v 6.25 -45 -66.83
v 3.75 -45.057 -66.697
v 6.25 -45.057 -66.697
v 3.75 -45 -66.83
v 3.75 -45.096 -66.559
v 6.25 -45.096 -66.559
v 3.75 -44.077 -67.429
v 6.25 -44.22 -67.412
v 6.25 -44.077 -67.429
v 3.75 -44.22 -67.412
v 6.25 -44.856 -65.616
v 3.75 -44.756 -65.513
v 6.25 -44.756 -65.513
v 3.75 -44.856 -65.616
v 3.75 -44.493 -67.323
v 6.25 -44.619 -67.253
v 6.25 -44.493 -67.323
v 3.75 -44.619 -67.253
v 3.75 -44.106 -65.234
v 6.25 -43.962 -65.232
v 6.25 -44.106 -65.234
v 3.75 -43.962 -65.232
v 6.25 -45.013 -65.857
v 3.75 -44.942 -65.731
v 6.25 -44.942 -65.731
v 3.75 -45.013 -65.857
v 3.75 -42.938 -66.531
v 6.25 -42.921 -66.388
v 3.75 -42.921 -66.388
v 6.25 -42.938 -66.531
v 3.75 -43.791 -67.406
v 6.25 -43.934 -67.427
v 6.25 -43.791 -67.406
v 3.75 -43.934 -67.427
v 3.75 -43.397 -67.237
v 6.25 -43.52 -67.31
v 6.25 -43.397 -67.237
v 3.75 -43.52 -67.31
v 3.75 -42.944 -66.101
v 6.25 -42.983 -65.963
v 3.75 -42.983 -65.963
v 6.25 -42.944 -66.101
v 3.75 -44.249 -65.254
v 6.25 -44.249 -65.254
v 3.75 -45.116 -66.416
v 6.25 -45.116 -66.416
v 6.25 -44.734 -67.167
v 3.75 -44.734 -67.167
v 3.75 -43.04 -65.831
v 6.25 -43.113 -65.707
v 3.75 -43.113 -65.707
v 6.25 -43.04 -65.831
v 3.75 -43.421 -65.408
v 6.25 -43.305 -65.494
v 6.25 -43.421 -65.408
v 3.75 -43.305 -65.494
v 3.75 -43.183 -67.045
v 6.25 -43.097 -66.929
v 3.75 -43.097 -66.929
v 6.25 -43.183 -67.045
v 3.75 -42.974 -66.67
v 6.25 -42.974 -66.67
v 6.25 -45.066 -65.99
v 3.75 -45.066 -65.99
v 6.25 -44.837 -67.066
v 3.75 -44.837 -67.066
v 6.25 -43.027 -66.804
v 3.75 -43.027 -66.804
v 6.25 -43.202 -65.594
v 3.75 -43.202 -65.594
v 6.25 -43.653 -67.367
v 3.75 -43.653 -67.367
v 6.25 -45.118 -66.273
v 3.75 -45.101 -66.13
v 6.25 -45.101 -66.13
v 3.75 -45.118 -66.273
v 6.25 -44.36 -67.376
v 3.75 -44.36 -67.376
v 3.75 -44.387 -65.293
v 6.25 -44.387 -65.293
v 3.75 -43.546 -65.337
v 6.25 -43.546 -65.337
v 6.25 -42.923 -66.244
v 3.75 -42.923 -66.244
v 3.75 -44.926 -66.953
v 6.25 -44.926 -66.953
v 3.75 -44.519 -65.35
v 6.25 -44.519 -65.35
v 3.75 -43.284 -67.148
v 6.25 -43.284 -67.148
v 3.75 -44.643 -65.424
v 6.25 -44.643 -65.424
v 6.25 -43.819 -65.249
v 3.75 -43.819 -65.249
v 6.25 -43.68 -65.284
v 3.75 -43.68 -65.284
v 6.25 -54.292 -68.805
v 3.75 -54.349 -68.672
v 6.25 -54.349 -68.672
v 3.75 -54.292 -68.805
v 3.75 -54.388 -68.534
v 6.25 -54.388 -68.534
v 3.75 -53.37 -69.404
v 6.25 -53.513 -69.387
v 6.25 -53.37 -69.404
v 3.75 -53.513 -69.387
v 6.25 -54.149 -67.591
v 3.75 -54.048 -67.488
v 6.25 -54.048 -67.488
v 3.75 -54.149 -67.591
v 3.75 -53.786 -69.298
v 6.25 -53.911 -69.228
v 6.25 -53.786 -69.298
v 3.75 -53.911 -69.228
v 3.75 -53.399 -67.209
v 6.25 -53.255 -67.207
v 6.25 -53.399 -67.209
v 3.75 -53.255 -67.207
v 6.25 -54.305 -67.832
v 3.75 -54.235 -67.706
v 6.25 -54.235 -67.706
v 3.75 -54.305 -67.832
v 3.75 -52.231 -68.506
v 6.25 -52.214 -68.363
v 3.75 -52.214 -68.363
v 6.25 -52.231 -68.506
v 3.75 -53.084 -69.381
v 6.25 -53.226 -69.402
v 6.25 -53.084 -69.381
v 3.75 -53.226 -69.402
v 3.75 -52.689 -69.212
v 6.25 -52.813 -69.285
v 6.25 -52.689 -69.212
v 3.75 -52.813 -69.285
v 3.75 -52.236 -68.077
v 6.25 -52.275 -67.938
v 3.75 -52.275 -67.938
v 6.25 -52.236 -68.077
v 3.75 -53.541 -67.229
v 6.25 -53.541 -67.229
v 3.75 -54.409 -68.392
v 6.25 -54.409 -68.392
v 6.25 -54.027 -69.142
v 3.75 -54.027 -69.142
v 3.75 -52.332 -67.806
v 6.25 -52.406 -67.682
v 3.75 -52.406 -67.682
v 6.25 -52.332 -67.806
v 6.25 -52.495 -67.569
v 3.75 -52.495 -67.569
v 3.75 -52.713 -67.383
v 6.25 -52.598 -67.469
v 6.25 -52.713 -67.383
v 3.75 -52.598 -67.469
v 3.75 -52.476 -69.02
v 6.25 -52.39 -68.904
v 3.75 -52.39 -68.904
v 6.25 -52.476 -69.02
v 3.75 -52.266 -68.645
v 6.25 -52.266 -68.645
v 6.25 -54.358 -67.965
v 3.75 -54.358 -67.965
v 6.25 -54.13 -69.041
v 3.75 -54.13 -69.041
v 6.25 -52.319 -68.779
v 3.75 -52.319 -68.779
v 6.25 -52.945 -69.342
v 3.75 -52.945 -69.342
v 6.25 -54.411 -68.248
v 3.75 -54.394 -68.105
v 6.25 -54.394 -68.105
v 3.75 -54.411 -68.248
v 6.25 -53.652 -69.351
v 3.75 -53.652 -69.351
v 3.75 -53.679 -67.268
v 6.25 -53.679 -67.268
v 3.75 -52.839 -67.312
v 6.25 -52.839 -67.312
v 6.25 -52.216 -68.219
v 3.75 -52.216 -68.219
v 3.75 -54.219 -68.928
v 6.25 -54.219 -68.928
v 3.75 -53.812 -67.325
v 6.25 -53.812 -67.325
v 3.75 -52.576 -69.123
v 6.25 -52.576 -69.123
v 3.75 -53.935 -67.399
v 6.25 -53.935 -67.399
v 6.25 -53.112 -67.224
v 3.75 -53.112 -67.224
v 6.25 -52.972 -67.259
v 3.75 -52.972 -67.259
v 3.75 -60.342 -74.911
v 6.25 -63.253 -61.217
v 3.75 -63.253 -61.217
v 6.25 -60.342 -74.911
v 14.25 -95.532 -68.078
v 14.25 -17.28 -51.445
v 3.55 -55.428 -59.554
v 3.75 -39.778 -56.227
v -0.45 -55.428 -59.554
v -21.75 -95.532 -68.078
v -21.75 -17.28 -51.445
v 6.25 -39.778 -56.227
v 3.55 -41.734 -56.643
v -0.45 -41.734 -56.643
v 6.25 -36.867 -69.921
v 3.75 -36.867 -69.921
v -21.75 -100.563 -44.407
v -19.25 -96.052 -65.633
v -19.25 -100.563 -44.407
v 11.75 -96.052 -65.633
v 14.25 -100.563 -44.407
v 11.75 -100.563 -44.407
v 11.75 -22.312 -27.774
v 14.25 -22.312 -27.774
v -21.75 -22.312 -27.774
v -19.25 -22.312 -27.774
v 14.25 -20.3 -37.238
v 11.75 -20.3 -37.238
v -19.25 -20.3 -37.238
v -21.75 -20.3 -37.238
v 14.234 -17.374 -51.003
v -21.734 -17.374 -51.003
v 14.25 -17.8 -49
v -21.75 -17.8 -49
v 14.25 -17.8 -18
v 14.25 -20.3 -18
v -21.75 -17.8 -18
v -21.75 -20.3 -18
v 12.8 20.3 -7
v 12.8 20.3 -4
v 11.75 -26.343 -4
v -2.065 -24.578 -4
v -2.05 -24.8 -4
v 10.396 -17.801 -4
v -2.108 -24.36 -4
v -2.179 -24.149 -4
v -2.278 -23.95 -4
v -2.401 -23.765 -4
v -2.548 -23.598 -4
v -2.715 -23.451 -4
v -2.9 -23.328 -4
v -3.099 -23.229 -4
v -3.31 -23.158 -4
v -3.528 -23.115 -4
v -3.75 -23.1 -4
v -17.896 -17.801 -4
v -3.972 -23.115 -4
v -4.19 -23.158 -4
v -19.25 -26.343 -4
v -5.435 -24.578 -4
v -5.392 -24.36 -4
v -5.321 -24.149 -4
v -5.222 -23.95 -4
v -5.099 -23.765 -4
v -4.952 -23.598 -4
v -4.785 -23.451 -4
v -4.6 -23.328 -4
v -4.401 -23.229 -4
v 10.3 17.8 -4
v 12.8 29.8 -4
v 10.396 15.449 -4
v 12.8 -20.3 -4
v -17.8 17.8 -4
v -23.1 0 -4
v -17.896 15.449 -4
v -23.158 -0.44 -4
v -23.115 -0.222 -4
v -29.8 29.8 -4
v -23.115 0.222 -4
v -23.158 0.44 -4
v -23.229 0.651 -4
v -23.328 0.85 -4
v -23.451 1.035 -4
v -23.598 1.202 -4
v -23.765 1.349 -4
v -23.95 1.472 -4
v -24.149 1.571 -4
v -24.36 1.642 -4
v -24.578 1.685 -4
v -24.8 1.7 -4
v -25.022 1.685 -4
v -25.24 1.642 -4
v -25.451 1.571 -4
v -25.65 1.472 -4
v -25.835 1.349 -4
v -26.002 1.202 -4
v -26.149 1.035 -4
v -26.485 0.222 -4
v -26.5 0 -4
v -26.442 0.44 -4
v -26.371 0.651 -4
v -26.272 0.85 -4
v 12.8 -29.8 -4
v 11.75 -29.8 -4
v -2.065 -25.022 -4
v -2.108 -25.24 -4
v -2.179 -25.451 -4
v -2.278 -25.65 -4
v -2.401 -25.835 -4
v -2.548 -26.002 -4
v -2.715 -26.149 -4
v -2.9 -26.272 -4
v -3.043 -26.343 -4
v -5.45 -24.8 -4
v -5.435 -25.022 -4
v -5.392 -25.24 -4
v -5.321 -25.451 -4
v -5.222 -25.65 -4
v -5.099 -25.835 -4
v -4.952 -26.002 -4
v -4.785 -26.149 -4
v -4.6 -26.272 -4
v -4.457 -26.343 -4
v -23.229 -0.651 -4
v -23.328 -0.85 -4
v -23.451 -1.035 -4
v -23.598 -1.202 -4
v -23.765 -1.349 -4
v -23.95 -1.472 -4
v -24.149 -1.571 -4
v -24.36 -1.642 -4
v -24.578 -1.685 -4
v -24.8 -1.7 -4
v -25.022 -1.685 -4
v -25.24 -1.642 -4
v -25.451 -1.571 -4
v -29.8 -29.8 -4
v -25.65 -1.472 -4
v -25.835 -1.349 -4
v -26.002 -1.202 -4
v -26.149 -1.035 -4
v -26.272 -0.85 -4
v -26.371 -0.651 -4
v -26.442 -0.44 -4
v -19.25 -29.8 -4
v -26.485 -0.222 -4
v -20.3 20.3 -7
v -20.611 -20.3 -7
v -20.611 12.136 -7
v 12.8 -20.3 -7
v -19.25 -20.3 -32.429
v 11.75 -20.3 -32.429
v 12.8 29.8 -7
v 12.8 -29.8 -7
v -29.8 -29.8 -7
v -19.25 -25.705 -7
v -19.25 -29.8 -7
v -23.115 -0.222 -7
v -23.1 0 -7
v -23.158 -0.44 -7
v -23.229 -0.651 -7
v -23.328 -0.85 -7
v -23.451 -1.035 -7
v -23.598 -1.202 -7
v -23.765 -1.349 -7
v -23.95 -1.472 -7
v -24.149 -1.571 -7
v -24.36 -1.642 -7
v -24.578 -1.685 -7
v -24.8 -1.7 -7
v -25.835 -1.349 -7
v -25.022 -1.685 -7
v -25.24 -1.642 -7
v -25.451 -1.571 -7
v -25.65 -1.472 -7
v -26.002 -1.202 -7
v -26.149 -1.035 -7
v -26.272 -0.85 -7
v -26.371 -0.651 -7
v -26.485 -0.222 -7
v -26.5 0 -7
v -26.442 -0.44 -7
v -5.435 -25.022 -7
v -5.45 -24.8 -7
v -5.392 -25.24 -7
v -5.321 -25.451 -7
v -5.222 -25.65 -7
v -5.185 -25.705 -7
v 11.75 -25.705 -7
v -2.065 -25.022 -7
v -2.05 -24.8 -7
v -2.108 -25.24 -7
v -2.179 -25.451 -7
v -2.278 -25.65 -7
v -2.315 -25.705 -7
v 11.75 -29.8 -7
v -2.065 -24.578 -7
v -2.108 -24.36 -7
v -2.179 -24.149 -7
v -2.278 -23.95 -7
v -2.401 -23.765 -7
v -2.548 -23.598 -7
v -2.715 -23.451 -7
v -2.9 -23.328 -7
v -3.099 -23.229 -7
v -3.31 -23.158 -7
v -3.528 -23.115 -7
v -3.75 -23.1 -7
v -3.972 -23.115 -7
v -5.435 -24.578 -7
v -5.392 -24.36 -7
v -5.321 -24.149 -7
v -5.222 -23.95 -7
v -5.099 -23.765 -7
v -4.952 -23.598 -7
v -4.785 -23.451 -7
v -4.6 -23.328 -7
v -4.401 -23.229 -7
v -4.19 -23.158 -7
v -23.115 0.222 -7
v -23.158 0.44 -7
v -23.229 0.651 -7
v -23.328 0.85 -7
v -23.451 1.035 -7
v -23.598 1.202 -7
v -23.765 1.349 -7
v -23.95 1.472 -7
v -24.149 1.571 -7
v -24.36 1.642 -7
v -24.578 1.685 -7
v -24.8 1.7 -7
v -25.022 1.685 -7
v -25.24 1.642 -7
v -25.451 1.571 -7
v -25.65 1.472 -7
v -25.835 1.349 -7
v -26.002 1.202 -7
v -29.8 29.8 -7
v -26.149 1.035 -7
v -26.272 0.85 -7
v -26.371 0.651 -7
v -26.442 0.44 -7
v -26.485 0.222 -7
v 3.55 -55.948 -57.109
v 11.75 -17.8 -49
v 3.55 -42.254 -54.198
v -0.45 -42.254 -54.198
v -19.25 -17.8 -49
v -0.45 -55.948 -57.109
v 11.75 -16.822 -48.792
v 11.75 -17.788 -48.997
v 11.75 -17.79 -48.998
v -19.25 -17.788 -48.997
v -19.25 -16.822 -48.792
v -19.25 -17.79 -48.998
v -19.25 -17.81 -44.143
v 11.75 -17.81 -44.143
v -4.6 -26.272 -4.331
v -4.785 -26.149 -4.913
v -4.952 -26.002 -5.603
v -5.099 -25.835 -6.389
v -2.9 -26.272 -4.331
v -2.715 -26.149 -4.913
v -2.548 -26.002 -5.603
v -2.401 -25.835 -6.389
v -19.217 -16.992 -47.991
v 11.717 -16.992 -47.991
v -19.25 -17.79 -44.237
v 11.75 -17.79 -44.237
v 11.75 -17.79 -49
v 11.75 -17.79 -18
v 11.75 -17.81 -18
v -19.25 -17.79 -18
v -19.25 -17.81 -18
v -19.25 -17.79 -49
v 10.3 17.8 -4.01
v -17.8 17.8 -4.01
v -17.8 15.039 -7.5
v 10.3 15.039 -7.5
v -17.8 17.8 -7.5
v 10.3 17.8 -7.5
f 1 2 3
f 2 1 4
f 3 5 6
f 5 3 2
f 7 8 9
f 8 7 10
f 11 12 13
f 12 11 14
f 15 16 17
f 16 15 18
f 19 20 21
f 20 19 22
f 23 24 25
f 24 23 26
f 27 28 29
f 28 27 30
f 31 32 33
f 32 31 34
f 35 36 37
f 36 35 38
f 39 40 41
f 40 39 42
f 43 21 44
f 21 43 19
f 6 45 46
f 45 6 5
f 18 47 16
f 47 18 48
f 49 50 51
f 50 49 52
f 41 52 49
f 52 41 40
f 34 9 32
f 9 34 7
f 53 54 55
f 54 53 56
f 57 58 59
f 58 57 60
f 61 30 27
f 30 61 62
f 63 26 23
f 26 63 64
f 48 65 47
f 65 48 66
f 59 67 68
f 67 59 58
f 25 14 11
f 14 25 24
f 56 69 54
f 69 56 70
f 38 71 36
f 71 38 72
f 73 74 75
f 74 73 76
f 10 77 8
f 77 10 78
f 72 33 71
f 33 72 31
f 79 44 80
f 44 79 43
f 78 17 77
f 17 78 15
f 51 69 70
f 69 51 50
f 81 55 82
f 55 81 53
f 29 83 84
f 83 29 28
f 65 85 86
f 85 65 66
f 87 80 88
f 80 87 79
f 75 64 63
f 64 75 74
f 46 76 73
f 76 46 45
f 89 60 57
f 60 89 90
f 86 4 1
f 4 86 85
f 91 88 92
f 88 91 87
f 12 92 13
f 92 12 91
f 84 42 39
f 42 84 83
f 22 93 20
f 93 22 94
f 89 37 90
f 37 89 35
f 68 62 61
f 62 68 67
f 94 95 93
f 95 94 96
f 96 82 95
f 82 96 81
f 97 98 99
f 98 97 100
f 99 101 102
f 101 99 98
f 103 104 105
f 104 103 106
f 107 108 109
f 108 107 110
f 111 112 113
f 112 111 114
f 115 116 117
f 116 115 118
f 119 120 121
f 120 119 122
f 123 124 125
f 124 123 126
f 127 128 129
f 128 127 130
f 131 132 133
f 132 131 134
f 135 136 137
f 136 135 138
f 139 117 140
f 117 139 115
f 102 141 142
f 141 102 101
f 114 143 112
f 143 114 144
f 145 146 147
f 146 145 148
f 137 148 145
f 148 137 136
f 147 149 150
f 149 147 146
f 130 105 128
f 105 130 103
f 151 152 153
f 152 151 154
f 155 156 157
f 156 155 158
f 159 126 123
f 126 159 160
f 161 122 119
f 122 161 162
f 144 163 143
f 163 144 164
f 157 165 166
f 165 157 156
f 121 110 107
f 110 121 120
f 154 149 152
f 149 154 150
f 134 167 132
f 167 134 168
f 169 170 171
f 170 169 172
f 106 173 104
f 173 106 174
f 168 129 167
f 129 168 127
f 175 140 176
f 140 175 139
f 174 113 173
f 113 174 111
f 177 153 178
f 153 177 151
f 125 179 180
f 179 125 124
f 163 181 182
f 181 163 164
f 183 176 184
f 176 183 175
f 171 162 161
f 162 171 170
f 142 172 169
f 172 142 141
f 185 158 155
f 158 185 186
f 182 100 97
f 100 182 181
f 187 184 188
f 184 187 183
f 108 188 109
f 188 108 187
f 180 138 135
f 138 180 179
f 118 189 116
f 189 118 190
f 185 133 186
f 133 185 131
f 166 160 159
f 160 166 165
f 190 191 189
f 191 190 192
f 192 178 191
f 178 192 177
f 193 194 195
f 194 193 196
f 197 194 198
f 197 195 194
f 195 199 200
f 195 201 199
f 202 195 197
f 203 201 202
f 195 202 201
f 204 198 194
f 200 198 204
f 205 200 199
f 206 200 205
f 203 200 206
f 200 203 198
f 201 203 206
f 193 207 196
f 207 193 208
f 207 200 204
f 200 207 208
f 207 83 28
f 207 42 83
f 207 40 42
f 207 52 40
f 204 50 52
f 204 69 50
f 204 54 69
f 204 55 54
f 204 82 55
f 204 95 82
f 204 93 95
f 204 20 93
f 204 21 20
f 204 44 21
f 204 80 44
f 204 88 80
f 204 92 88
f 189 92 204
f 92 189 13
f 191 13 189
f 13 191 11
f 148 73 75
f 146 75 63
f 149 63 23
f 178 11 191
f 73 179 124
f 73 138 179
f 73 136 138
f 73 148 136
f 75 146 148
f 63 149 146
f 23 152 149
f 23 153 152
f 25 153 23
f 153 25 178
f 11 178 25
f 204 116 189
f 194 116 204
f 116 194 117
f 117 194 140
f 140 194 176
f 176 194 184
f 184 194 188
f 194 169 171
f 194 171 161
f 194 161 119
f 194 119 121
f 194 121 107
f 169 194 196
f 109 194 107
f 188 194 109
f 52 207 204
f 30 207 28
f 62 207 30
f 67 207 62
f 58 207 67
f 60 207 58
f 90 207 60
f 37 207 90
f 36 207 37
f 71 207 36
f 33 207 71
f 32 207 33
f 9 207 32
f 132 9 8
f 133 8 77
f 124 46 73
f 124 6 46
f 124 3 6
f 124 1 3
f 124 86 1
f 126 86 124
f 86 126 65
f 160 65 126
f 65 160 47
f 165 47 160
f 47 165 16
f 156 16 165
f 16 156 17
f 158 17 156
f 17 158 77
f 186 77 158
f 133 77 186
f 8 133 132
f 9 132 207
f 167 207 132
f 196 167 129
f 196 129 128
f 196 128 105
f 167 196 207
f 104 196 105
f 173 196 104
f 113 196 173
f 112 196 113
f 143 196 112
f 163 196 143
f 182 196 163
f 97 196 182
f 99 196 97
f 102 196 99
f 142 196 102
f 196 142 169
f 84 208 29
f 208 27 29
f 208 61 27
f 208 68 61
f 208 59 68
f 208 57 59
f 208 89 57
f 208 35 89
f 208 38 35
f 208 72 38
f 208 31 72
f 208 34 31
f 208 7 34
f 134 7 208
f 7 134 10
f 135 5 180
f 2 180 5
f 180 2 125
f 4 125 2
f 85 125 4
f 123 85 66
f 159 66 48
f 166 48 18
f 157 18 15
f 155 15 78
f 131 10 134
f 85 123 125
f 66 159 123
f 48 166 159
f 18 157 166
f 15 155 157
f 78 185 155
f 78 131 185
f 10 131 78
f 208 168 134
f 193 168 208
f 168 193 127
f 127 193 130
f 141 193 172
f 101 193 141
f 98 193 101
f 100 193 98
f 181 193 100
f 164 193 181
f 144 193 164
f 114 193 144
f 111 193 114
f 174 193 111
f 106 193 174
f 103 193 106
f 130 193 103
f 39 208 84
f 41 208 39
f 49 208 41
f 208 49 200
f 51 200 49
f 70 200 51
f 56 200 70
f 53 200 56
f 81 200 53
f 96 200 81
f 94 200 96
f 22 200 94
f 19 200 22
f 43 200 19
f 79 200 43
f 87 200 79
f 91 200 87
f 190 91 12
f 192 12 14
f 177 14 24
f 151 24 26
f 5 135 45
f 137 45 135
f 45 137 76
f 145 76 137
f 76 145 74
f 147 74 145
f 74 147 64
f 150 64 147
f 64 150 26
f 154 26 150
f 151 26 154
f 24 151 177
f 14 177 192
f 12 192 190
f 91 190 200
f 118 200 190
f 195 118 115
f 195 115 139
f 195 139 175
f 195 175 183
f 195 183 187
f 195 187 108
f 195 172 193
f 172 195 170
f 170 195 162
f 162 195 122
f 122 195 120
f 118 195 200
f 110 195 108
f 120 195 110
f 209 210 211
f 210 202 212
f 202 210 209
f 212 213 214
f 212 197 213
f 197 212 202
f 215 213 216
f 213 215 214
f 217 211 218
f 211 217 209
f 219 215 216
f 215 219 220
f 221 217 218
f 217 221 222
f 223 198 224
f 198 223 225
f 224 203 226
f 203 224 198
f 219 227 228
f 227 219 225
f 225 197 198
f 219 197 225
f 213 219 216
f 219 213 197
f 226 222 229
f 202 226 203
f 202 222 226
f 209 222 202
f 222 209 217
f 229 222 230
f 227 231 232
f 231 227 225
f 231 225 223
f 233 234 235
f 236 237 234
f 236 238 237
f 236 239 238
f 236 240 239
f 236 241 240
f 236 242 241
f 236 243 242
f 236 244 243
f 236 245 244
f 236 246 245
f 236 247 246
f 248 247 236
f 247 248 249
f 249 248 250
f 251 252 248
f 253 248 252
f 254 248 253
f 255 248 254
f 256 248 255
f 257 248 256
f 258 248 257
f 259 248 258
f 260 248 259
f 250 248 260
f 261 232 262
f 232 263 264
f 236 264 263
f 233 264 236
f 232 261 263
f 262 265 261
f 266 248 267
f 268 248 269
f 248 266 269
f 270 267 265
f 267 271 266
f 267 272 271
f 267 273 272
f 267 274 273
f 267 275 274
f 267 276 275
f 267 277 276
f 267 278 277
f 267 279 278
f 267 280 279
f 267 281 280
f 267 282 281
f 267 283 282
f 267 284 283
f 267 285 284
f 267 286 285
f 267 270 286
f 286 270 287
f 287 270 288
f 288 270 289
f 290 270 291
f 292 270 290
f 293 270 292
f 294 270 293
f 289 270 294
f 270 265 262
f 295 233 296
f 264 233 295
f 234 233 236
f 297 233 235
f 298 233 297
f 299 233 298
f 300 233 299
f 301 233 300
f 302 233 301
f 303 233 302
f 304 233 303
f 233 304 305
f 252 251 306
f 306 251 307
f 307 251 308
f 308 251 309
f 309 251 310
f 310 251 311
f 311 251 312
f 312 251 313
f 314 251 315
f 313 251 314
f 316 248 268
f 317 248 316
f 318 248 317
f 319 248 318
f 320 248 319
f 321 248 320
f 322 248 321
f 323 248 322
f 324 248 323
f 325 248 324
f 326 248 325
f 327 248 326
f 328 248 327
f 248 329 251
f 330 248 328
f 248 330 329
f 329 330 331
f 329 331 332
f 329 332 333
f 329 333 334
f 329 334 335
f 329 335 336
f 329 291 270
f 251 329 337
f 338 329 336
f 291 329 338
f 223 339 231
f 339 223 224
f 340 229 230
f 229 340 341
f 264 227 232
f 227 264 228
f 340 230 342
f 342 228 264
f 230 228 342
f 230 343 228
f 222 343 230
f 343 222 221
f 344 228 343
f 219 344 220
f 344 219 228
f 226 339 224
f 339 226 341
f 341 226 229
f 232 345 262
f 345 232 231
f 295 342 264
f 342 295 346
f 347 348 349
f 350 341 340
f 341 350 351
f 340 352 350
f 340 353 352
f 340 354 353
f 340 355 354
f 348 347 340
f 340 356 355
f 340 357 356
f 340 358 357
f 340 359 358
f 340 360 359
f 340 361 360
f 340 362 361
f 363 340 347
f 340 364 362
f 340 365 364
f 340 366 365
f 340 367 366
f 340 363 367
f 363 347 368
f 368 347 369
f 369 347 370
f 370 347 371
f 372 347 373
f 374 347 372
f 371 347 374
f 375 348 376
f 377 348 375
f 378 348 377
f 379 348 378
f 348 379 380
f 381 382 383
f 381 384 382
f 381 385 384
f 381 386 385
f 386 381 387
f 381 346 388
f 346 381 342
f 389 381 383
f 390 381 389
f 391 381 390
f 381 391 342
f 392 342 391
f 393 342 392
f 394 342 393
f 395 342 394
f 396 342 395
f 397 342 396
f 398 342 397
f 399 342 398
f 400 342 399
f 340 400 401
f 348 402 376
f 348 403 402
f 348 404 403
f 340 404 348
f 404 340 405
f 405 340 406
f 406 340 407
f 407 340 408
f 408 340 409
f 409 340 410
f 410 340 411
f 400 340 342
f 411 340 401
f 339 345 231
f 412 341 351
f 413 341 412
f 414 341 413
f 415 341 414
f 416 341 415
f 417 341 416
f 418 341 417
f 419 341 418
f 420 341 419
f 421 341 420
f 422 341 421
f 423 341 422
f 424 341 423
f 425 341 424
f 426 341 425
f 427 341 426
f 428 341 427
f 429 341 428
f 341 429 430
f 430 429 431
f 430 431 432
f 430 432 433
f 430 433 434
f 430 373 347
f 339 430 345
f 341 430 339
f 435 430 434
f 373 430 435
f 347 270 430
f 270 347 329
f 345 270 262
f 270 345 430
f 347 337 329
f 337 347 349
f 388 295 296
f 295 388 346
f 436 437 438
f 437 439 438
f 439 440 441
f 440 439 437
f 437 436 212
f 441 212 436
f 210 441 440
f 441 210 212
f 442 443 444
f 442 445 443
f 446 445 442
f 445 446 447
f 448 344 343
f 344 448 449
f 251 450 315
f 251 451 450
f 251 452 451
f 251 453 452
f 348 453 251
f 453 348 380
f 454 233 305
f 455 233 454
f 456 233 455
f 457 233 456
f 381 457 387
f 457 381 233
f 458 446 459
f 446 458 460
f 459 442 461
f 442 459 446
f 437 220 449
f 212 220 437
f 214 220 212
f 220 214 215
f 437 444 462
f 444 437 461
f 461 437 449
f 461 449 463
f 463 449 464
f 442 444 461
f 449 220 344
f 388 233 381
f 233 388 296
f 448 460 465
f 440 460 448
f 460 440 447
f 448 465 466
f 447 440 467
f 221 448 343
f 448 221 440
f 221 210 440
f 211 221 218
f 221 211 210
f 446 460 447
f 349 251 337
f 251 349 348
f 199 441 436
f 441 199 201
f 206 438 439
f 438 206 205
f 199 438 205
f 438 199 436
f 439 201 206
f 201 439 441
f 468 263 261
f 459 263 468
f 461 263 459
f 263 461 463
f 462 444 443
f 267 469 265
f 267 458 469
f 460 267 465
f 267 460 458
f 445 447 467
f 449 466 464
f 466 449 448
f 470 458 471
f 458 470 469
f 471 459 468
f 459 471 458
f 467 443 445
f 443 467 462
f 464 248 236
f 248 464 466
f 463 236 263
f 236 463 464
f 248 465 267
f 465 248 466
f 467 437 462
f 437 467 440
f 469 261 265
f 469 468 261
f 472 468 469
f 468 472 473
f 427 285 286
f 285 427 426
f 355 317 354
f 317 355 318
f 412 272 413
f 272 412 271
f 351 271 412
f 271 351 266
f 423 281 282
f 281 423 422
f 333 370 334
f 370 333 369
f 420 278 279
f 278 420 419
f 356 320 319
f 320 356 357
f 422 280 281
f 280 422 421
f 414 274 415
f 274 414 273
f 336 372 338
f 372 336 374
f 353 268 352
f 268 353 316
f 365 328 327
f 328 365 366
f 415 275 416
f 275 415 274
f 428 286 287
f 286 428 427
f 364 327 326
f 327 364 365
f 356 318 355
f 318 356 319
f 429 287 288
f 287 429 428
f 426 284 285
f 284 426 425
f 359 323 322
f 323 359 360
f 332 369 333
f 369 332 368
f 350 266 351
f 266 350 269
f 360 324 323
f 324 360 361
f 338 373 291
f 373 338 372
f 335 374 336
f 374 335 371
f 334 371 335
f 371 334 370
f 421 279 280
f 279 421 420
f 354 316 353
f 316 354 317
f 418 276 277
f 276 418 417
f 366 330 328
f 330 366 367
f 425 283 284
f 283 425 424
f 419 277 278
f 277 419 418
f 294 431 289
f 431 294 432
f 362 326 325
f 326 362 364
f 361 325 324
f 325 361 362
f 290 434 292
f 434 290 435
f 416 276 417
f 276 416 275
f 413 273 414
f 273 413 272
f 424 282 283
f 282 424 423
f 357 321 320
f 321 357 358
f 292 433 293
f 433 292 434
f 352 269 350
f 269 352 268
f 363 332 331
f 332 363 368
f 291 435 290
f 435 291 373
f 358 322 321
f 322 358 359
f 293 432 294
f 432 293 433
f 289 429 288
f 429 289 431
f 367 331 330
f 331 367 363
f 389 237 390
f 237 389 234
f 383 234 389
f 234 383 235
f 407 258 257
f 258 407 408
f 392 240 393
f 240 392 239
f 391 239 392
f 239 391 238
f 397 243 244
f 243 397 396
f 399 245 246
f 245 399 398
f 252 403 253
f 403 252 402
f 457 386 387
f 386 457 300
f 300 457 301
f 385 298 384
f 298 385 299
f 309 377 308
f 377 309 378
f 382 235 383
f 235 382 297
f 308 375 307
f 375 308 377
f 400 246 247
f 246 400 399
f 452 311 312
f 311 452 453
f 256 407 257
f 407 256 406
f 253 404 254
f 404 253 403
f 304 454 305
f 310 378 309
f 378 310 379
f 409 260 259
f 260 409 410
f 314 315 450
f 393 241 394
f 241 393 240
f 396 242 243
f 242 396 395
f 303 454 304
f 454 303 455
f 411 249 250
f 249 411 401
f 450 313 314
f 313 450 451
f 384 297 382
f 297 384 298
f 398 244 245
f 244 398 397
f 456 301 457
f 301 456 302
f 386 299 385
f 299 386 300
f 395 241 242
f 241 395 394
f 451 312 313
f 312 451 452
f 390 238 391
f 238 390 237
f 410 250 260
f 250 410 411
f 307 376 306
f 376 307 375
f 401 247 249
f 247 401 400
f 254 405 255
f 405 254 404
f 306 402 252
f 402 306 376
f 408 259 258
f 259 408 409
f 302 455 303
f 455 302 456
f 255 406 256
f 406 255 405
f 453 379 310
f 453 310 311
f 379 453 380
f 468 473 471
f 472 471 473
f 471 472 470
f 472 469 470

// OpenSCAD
// file: measurements.scad
// Measurements of YOUR table, shared by every printed part, in millimetres.
//
// These are placeholders until the real table is measured with calipers. Edit
// the numbers here (nothing else in this file), save, then open a part and
// export it. See docs/3d-printing.md.

// --- The playfield ----------------------------------------------------------

// Thickness of the playfield at the trapdoor holes.
playfield_thickness = 12.7;

// --- Each trapdoor hole ------------------------------------------------------
// "Width" runs across the table (left to right); "length" runs up the table.

// Width of the hole.
hole_width = 40;

// Length of the hole.
hole_length = 40;

// --- Screws -----------------------------------------------------------------

// Wood screws into the underside of the playfield. They must be SHORTER than
// the playfield is thick, or they'll come out through the artwork. 3.5 mm x
// 9.5 mm (No. 6 x 3/8") suits a 12.7 mm playfield.
wood_screw_diameter = 3.5;

// Steel rod used as each flap's hinge pin.
hinge_pin_diameter = 2;

// --- Printing ---------------------------------------------------------------

// Gap left between parts that fit together, for a typical printer. Make it
// bigger if parts are too tight, smaller if they're loose.
fit_clearance = 0.4;
// file: common.scad
// Shared helpers for the printed parts. Nothing to change here: table sizes
// are in measurements.scad, and each part's options are in its own file.

include <measurements.scad>

// A real pinball: 1 1/16 inch.
ball_diameter = 27;

// Smooth enough curves for printing.
$fn = 48;

// A countersunk hole for a wood screw going up into the playfield, through a
// plate `thickness` thick lying on z = 0 (its top face is the side that
// presses against the playfield).
module wood_screw_hole(thickness) {
    head = wood_screw_diameter * 2;
    translate([0, 0, -0.01]) {
        cylinder(d = wood_screw_diameter + 0.3, h = thickness + 0.02);
        // The head sits in the face away from the playfield.
        cylinder(d1 = head, d2 = wood_screw_diameter + 0.3, h = (head - wood_screw_diameter) / 2);
    }
}

// --- Trapdoor geometry, shared so the frame, flap, lifter and chute fit -----
//
// Coordinates: the origin is the centre of the hole on the playfield's
// underside. x runs across the table (left to right), y up the table (towards
// the back), z up. The playfield's top surface is at z = playfield_thickness.

// The frame's sleeve slides up into the hole.
frame_wall = 2;
outer_width = hole_width - fit_clearance;
outer_length = hole_length - fit_clearance;
inner_width = outer_width - 2 * frame_wall;
inner_length = outer_length - 2 * frame_wall;
// The flange under the playfield.
flange_width = 10;
flange_thickness = 4;

// The flap: a plate that sits flush in the top of the frame, pivoting on the
// hinge pin along its uphill (back) edge.
flap_thickness = 3;
knuckle_radius = 2.5;
pin_y = inner_length / 2 - knuckle_radius - fit_clearance;
pin_z = playfield_thickness - knuckle_radius;
flap_width = inner_width - 2 * fit_clearance;
flap_front = -inner_length / 2 + fit_clearance;

// The servo (an MG90S) hangs under the flange on the right, its shaft pointing
// left into the frame, and turns the lifter arm that the flap rests on.
servo_body = [22.8, 12.2, 22.5];  // long, wide, top face to base
servo_shaft_from_end = 5.9;       // shaft centre from the near end of the body
servo_tab_from_top = 6.5;         // mounting tabs below the shaft's face
servo_tab_spacing = 27.8;
servo_tab_hole = 1.8;             // for the screws that come with the servo
// Where the lifter arm swings: just inside the frame's right wall.
lifter_thickness = 3;
lifter_x = inner_width / 2 - 1 - lifter_thickness;
servo_top_x = lifter_x + lifter_thickness + 3;  // the horn sits ~3 mm out
servo_shaft_y = flap_front + 9;                 // under the flap's front edge
servo_shaft_z = -flange_thickness - servo_body[1] / 2 - 1;
// The lifter reaches from the shaft up to the underside of the closed flap.
lifter_length = playfield_thickness - flap_thickness - servo_shaft_z;

// The chute catches the ball beside the lifter and servo: from the frame's left
// wall to just short of the lifter arm.
chute_wall = 2.5;
chute_right = lifter_x - 1 - chute_wall;
chute_opening = chute_right + inner_width / 2;
// Pilot holes in the frame's flange for the chute's two screws (M3 x 6 mm
// self-tapping): one on the left, one at the front.
chute_screws = [
    [-(outer_width / 2 + flange_width / 2), 0],
    [(chute_right - inner_width / 2) / 2, -(outer_length / 2 + flange_width / 2)],
];
assert(chute_opening >= ball_diameter + 1,
    "The hole is too narrow for the ball to fall past the lifter arm: check hole_width in measurements.scad.");
// main file
// Trapdoor chute: one per trapdoor. It screws under the frame with two M3 x 6 mm
// self-tapping screws, catches the ball, and rolls it away towards the outhole.
// A lever microswitch (KW11 type) screws to the tab under its floor, with the
// lever poking up through the slot, so the game knows a ball came through.
//
// Print it upside down (flange on the bed). The channel's floor needs
// supports under its slope; most slicers add them with "supports: on".

include <common.scad>

/* [Chute] */
// Which way the ball rolls out. ("right" isn't offered: the servo is there.)
exit = "front"; // [front, left]
// How far below the frame the funnel drops before the channel starts.
drop = 45; // [35:1:100]
// Slope of the channel, in degrees.
slope = 12; // [5:1:30]
// Length of the channel.
length = 80; // [30:5:250]
// Where the microswitch sits along the channel.
switch_at = 25; // [15:1:60]

channel_width = ball_diameter + 4;
channel_height = ball_diameter + 4;
wall = chute_wall;

chute();

module chute() {
    centre_x = (chute_right - inner_width / 2) / 2;
    along = exit == "front" ? inner_length : chute_opening;
    across = exit == "front" ? chute_opening : inner_length;
    difference() {
        union() {
            translate([centre_x, 0, -flange_thickness])
                rotate([0, 0, exit == "front" ? -90 : 180])
                    funnel_and_channel(along, across);
            flange();
        }
        // Open the top.
        translate([-inner_width / 2, -inner_length / 2, -flange_thickness - 3.5])
            cube([chute_opening, inner_length, 10]);
        translate([centre_x, 0, -flange_thickness])
            rotate([0, 0, exit == "front" ? -90 : 180])
                cavity(along, across);
        for (p = chute_screws)
            translate([p[0], p[1], -flange_thickness - 4]) cylinder(d = 3.4, h = 5);
    }
}

// The plate that screws to the frame's flange.
module flange() {
    x0 = -outer_width / 2 - flange_width;
    y0 = -outer_length / 2 - flange_width;
    translate([x0, y0, -flange_thickness - 3])
        cube([chute_right + wall - x0, outer_length + 2 * flange_width, 3]);
}

// In local coordinates: the opening is centred on the origin, `along` long in
// x and `across` wide in y, its top at z = 0; the ball leaves along +x.
module funnel_and_channel(along, across) {
    // Funnel walls.
    hull() {
        translate([-along / 2 - wall, -across / 2 - wall, -3]) cube([along + 2 * wall, across + 2 * wall, 3]);
        translate([along / 2, -channel_width / 2 - wall, -drop - wall]) cube([wall, channel_width + 2 * wall, channel_height + wall]);
    }
    // Channel walls and floor.
    translate([along / 2, 0, -drop])
        rotate([0, slope, 0]) {
            translate([0, -channel_width / 2 - wall, -wall])
                cube([length, channel_width + 2 * wall, channel_height * 0.7 + wall]);
            // The microswitch tab, under the floor beside the slot.
            translate([switch_at - 2, channel_width / 2 - 8, -wall - 14])
                difference() {
                    cube([24, 2.5, 14]);
                    for (dx = [6.25, 15.75])
                        translate([dx, -1, 5]) rotate([-90, 0, 0]) cylinder(d = 2.2, h = 5);
                }
        }
}

module cavity(along, across) {
    hull() {
        translate([-along / 2, -across / 2, -0.01]) cube([along, across, 1]);
        translate([along / 2 - 0.01, -channel_width / 2, -drop]) cube([0.02, channel_width, channel_height]);
    }
    translate([along / 2, 0, -drop])
        rotate([0, slope, 0]) {
            translate([-1, -channel_width / 2, 0]) cube([length + 2, channel_width, channel_height * 2]);
            // The slot for the switch's lever.
            translate([switch_at, channel_width / 2 - 8 - 4.2, -wall - 1]) cube([14, 4, wall + 2]);
        }
}
